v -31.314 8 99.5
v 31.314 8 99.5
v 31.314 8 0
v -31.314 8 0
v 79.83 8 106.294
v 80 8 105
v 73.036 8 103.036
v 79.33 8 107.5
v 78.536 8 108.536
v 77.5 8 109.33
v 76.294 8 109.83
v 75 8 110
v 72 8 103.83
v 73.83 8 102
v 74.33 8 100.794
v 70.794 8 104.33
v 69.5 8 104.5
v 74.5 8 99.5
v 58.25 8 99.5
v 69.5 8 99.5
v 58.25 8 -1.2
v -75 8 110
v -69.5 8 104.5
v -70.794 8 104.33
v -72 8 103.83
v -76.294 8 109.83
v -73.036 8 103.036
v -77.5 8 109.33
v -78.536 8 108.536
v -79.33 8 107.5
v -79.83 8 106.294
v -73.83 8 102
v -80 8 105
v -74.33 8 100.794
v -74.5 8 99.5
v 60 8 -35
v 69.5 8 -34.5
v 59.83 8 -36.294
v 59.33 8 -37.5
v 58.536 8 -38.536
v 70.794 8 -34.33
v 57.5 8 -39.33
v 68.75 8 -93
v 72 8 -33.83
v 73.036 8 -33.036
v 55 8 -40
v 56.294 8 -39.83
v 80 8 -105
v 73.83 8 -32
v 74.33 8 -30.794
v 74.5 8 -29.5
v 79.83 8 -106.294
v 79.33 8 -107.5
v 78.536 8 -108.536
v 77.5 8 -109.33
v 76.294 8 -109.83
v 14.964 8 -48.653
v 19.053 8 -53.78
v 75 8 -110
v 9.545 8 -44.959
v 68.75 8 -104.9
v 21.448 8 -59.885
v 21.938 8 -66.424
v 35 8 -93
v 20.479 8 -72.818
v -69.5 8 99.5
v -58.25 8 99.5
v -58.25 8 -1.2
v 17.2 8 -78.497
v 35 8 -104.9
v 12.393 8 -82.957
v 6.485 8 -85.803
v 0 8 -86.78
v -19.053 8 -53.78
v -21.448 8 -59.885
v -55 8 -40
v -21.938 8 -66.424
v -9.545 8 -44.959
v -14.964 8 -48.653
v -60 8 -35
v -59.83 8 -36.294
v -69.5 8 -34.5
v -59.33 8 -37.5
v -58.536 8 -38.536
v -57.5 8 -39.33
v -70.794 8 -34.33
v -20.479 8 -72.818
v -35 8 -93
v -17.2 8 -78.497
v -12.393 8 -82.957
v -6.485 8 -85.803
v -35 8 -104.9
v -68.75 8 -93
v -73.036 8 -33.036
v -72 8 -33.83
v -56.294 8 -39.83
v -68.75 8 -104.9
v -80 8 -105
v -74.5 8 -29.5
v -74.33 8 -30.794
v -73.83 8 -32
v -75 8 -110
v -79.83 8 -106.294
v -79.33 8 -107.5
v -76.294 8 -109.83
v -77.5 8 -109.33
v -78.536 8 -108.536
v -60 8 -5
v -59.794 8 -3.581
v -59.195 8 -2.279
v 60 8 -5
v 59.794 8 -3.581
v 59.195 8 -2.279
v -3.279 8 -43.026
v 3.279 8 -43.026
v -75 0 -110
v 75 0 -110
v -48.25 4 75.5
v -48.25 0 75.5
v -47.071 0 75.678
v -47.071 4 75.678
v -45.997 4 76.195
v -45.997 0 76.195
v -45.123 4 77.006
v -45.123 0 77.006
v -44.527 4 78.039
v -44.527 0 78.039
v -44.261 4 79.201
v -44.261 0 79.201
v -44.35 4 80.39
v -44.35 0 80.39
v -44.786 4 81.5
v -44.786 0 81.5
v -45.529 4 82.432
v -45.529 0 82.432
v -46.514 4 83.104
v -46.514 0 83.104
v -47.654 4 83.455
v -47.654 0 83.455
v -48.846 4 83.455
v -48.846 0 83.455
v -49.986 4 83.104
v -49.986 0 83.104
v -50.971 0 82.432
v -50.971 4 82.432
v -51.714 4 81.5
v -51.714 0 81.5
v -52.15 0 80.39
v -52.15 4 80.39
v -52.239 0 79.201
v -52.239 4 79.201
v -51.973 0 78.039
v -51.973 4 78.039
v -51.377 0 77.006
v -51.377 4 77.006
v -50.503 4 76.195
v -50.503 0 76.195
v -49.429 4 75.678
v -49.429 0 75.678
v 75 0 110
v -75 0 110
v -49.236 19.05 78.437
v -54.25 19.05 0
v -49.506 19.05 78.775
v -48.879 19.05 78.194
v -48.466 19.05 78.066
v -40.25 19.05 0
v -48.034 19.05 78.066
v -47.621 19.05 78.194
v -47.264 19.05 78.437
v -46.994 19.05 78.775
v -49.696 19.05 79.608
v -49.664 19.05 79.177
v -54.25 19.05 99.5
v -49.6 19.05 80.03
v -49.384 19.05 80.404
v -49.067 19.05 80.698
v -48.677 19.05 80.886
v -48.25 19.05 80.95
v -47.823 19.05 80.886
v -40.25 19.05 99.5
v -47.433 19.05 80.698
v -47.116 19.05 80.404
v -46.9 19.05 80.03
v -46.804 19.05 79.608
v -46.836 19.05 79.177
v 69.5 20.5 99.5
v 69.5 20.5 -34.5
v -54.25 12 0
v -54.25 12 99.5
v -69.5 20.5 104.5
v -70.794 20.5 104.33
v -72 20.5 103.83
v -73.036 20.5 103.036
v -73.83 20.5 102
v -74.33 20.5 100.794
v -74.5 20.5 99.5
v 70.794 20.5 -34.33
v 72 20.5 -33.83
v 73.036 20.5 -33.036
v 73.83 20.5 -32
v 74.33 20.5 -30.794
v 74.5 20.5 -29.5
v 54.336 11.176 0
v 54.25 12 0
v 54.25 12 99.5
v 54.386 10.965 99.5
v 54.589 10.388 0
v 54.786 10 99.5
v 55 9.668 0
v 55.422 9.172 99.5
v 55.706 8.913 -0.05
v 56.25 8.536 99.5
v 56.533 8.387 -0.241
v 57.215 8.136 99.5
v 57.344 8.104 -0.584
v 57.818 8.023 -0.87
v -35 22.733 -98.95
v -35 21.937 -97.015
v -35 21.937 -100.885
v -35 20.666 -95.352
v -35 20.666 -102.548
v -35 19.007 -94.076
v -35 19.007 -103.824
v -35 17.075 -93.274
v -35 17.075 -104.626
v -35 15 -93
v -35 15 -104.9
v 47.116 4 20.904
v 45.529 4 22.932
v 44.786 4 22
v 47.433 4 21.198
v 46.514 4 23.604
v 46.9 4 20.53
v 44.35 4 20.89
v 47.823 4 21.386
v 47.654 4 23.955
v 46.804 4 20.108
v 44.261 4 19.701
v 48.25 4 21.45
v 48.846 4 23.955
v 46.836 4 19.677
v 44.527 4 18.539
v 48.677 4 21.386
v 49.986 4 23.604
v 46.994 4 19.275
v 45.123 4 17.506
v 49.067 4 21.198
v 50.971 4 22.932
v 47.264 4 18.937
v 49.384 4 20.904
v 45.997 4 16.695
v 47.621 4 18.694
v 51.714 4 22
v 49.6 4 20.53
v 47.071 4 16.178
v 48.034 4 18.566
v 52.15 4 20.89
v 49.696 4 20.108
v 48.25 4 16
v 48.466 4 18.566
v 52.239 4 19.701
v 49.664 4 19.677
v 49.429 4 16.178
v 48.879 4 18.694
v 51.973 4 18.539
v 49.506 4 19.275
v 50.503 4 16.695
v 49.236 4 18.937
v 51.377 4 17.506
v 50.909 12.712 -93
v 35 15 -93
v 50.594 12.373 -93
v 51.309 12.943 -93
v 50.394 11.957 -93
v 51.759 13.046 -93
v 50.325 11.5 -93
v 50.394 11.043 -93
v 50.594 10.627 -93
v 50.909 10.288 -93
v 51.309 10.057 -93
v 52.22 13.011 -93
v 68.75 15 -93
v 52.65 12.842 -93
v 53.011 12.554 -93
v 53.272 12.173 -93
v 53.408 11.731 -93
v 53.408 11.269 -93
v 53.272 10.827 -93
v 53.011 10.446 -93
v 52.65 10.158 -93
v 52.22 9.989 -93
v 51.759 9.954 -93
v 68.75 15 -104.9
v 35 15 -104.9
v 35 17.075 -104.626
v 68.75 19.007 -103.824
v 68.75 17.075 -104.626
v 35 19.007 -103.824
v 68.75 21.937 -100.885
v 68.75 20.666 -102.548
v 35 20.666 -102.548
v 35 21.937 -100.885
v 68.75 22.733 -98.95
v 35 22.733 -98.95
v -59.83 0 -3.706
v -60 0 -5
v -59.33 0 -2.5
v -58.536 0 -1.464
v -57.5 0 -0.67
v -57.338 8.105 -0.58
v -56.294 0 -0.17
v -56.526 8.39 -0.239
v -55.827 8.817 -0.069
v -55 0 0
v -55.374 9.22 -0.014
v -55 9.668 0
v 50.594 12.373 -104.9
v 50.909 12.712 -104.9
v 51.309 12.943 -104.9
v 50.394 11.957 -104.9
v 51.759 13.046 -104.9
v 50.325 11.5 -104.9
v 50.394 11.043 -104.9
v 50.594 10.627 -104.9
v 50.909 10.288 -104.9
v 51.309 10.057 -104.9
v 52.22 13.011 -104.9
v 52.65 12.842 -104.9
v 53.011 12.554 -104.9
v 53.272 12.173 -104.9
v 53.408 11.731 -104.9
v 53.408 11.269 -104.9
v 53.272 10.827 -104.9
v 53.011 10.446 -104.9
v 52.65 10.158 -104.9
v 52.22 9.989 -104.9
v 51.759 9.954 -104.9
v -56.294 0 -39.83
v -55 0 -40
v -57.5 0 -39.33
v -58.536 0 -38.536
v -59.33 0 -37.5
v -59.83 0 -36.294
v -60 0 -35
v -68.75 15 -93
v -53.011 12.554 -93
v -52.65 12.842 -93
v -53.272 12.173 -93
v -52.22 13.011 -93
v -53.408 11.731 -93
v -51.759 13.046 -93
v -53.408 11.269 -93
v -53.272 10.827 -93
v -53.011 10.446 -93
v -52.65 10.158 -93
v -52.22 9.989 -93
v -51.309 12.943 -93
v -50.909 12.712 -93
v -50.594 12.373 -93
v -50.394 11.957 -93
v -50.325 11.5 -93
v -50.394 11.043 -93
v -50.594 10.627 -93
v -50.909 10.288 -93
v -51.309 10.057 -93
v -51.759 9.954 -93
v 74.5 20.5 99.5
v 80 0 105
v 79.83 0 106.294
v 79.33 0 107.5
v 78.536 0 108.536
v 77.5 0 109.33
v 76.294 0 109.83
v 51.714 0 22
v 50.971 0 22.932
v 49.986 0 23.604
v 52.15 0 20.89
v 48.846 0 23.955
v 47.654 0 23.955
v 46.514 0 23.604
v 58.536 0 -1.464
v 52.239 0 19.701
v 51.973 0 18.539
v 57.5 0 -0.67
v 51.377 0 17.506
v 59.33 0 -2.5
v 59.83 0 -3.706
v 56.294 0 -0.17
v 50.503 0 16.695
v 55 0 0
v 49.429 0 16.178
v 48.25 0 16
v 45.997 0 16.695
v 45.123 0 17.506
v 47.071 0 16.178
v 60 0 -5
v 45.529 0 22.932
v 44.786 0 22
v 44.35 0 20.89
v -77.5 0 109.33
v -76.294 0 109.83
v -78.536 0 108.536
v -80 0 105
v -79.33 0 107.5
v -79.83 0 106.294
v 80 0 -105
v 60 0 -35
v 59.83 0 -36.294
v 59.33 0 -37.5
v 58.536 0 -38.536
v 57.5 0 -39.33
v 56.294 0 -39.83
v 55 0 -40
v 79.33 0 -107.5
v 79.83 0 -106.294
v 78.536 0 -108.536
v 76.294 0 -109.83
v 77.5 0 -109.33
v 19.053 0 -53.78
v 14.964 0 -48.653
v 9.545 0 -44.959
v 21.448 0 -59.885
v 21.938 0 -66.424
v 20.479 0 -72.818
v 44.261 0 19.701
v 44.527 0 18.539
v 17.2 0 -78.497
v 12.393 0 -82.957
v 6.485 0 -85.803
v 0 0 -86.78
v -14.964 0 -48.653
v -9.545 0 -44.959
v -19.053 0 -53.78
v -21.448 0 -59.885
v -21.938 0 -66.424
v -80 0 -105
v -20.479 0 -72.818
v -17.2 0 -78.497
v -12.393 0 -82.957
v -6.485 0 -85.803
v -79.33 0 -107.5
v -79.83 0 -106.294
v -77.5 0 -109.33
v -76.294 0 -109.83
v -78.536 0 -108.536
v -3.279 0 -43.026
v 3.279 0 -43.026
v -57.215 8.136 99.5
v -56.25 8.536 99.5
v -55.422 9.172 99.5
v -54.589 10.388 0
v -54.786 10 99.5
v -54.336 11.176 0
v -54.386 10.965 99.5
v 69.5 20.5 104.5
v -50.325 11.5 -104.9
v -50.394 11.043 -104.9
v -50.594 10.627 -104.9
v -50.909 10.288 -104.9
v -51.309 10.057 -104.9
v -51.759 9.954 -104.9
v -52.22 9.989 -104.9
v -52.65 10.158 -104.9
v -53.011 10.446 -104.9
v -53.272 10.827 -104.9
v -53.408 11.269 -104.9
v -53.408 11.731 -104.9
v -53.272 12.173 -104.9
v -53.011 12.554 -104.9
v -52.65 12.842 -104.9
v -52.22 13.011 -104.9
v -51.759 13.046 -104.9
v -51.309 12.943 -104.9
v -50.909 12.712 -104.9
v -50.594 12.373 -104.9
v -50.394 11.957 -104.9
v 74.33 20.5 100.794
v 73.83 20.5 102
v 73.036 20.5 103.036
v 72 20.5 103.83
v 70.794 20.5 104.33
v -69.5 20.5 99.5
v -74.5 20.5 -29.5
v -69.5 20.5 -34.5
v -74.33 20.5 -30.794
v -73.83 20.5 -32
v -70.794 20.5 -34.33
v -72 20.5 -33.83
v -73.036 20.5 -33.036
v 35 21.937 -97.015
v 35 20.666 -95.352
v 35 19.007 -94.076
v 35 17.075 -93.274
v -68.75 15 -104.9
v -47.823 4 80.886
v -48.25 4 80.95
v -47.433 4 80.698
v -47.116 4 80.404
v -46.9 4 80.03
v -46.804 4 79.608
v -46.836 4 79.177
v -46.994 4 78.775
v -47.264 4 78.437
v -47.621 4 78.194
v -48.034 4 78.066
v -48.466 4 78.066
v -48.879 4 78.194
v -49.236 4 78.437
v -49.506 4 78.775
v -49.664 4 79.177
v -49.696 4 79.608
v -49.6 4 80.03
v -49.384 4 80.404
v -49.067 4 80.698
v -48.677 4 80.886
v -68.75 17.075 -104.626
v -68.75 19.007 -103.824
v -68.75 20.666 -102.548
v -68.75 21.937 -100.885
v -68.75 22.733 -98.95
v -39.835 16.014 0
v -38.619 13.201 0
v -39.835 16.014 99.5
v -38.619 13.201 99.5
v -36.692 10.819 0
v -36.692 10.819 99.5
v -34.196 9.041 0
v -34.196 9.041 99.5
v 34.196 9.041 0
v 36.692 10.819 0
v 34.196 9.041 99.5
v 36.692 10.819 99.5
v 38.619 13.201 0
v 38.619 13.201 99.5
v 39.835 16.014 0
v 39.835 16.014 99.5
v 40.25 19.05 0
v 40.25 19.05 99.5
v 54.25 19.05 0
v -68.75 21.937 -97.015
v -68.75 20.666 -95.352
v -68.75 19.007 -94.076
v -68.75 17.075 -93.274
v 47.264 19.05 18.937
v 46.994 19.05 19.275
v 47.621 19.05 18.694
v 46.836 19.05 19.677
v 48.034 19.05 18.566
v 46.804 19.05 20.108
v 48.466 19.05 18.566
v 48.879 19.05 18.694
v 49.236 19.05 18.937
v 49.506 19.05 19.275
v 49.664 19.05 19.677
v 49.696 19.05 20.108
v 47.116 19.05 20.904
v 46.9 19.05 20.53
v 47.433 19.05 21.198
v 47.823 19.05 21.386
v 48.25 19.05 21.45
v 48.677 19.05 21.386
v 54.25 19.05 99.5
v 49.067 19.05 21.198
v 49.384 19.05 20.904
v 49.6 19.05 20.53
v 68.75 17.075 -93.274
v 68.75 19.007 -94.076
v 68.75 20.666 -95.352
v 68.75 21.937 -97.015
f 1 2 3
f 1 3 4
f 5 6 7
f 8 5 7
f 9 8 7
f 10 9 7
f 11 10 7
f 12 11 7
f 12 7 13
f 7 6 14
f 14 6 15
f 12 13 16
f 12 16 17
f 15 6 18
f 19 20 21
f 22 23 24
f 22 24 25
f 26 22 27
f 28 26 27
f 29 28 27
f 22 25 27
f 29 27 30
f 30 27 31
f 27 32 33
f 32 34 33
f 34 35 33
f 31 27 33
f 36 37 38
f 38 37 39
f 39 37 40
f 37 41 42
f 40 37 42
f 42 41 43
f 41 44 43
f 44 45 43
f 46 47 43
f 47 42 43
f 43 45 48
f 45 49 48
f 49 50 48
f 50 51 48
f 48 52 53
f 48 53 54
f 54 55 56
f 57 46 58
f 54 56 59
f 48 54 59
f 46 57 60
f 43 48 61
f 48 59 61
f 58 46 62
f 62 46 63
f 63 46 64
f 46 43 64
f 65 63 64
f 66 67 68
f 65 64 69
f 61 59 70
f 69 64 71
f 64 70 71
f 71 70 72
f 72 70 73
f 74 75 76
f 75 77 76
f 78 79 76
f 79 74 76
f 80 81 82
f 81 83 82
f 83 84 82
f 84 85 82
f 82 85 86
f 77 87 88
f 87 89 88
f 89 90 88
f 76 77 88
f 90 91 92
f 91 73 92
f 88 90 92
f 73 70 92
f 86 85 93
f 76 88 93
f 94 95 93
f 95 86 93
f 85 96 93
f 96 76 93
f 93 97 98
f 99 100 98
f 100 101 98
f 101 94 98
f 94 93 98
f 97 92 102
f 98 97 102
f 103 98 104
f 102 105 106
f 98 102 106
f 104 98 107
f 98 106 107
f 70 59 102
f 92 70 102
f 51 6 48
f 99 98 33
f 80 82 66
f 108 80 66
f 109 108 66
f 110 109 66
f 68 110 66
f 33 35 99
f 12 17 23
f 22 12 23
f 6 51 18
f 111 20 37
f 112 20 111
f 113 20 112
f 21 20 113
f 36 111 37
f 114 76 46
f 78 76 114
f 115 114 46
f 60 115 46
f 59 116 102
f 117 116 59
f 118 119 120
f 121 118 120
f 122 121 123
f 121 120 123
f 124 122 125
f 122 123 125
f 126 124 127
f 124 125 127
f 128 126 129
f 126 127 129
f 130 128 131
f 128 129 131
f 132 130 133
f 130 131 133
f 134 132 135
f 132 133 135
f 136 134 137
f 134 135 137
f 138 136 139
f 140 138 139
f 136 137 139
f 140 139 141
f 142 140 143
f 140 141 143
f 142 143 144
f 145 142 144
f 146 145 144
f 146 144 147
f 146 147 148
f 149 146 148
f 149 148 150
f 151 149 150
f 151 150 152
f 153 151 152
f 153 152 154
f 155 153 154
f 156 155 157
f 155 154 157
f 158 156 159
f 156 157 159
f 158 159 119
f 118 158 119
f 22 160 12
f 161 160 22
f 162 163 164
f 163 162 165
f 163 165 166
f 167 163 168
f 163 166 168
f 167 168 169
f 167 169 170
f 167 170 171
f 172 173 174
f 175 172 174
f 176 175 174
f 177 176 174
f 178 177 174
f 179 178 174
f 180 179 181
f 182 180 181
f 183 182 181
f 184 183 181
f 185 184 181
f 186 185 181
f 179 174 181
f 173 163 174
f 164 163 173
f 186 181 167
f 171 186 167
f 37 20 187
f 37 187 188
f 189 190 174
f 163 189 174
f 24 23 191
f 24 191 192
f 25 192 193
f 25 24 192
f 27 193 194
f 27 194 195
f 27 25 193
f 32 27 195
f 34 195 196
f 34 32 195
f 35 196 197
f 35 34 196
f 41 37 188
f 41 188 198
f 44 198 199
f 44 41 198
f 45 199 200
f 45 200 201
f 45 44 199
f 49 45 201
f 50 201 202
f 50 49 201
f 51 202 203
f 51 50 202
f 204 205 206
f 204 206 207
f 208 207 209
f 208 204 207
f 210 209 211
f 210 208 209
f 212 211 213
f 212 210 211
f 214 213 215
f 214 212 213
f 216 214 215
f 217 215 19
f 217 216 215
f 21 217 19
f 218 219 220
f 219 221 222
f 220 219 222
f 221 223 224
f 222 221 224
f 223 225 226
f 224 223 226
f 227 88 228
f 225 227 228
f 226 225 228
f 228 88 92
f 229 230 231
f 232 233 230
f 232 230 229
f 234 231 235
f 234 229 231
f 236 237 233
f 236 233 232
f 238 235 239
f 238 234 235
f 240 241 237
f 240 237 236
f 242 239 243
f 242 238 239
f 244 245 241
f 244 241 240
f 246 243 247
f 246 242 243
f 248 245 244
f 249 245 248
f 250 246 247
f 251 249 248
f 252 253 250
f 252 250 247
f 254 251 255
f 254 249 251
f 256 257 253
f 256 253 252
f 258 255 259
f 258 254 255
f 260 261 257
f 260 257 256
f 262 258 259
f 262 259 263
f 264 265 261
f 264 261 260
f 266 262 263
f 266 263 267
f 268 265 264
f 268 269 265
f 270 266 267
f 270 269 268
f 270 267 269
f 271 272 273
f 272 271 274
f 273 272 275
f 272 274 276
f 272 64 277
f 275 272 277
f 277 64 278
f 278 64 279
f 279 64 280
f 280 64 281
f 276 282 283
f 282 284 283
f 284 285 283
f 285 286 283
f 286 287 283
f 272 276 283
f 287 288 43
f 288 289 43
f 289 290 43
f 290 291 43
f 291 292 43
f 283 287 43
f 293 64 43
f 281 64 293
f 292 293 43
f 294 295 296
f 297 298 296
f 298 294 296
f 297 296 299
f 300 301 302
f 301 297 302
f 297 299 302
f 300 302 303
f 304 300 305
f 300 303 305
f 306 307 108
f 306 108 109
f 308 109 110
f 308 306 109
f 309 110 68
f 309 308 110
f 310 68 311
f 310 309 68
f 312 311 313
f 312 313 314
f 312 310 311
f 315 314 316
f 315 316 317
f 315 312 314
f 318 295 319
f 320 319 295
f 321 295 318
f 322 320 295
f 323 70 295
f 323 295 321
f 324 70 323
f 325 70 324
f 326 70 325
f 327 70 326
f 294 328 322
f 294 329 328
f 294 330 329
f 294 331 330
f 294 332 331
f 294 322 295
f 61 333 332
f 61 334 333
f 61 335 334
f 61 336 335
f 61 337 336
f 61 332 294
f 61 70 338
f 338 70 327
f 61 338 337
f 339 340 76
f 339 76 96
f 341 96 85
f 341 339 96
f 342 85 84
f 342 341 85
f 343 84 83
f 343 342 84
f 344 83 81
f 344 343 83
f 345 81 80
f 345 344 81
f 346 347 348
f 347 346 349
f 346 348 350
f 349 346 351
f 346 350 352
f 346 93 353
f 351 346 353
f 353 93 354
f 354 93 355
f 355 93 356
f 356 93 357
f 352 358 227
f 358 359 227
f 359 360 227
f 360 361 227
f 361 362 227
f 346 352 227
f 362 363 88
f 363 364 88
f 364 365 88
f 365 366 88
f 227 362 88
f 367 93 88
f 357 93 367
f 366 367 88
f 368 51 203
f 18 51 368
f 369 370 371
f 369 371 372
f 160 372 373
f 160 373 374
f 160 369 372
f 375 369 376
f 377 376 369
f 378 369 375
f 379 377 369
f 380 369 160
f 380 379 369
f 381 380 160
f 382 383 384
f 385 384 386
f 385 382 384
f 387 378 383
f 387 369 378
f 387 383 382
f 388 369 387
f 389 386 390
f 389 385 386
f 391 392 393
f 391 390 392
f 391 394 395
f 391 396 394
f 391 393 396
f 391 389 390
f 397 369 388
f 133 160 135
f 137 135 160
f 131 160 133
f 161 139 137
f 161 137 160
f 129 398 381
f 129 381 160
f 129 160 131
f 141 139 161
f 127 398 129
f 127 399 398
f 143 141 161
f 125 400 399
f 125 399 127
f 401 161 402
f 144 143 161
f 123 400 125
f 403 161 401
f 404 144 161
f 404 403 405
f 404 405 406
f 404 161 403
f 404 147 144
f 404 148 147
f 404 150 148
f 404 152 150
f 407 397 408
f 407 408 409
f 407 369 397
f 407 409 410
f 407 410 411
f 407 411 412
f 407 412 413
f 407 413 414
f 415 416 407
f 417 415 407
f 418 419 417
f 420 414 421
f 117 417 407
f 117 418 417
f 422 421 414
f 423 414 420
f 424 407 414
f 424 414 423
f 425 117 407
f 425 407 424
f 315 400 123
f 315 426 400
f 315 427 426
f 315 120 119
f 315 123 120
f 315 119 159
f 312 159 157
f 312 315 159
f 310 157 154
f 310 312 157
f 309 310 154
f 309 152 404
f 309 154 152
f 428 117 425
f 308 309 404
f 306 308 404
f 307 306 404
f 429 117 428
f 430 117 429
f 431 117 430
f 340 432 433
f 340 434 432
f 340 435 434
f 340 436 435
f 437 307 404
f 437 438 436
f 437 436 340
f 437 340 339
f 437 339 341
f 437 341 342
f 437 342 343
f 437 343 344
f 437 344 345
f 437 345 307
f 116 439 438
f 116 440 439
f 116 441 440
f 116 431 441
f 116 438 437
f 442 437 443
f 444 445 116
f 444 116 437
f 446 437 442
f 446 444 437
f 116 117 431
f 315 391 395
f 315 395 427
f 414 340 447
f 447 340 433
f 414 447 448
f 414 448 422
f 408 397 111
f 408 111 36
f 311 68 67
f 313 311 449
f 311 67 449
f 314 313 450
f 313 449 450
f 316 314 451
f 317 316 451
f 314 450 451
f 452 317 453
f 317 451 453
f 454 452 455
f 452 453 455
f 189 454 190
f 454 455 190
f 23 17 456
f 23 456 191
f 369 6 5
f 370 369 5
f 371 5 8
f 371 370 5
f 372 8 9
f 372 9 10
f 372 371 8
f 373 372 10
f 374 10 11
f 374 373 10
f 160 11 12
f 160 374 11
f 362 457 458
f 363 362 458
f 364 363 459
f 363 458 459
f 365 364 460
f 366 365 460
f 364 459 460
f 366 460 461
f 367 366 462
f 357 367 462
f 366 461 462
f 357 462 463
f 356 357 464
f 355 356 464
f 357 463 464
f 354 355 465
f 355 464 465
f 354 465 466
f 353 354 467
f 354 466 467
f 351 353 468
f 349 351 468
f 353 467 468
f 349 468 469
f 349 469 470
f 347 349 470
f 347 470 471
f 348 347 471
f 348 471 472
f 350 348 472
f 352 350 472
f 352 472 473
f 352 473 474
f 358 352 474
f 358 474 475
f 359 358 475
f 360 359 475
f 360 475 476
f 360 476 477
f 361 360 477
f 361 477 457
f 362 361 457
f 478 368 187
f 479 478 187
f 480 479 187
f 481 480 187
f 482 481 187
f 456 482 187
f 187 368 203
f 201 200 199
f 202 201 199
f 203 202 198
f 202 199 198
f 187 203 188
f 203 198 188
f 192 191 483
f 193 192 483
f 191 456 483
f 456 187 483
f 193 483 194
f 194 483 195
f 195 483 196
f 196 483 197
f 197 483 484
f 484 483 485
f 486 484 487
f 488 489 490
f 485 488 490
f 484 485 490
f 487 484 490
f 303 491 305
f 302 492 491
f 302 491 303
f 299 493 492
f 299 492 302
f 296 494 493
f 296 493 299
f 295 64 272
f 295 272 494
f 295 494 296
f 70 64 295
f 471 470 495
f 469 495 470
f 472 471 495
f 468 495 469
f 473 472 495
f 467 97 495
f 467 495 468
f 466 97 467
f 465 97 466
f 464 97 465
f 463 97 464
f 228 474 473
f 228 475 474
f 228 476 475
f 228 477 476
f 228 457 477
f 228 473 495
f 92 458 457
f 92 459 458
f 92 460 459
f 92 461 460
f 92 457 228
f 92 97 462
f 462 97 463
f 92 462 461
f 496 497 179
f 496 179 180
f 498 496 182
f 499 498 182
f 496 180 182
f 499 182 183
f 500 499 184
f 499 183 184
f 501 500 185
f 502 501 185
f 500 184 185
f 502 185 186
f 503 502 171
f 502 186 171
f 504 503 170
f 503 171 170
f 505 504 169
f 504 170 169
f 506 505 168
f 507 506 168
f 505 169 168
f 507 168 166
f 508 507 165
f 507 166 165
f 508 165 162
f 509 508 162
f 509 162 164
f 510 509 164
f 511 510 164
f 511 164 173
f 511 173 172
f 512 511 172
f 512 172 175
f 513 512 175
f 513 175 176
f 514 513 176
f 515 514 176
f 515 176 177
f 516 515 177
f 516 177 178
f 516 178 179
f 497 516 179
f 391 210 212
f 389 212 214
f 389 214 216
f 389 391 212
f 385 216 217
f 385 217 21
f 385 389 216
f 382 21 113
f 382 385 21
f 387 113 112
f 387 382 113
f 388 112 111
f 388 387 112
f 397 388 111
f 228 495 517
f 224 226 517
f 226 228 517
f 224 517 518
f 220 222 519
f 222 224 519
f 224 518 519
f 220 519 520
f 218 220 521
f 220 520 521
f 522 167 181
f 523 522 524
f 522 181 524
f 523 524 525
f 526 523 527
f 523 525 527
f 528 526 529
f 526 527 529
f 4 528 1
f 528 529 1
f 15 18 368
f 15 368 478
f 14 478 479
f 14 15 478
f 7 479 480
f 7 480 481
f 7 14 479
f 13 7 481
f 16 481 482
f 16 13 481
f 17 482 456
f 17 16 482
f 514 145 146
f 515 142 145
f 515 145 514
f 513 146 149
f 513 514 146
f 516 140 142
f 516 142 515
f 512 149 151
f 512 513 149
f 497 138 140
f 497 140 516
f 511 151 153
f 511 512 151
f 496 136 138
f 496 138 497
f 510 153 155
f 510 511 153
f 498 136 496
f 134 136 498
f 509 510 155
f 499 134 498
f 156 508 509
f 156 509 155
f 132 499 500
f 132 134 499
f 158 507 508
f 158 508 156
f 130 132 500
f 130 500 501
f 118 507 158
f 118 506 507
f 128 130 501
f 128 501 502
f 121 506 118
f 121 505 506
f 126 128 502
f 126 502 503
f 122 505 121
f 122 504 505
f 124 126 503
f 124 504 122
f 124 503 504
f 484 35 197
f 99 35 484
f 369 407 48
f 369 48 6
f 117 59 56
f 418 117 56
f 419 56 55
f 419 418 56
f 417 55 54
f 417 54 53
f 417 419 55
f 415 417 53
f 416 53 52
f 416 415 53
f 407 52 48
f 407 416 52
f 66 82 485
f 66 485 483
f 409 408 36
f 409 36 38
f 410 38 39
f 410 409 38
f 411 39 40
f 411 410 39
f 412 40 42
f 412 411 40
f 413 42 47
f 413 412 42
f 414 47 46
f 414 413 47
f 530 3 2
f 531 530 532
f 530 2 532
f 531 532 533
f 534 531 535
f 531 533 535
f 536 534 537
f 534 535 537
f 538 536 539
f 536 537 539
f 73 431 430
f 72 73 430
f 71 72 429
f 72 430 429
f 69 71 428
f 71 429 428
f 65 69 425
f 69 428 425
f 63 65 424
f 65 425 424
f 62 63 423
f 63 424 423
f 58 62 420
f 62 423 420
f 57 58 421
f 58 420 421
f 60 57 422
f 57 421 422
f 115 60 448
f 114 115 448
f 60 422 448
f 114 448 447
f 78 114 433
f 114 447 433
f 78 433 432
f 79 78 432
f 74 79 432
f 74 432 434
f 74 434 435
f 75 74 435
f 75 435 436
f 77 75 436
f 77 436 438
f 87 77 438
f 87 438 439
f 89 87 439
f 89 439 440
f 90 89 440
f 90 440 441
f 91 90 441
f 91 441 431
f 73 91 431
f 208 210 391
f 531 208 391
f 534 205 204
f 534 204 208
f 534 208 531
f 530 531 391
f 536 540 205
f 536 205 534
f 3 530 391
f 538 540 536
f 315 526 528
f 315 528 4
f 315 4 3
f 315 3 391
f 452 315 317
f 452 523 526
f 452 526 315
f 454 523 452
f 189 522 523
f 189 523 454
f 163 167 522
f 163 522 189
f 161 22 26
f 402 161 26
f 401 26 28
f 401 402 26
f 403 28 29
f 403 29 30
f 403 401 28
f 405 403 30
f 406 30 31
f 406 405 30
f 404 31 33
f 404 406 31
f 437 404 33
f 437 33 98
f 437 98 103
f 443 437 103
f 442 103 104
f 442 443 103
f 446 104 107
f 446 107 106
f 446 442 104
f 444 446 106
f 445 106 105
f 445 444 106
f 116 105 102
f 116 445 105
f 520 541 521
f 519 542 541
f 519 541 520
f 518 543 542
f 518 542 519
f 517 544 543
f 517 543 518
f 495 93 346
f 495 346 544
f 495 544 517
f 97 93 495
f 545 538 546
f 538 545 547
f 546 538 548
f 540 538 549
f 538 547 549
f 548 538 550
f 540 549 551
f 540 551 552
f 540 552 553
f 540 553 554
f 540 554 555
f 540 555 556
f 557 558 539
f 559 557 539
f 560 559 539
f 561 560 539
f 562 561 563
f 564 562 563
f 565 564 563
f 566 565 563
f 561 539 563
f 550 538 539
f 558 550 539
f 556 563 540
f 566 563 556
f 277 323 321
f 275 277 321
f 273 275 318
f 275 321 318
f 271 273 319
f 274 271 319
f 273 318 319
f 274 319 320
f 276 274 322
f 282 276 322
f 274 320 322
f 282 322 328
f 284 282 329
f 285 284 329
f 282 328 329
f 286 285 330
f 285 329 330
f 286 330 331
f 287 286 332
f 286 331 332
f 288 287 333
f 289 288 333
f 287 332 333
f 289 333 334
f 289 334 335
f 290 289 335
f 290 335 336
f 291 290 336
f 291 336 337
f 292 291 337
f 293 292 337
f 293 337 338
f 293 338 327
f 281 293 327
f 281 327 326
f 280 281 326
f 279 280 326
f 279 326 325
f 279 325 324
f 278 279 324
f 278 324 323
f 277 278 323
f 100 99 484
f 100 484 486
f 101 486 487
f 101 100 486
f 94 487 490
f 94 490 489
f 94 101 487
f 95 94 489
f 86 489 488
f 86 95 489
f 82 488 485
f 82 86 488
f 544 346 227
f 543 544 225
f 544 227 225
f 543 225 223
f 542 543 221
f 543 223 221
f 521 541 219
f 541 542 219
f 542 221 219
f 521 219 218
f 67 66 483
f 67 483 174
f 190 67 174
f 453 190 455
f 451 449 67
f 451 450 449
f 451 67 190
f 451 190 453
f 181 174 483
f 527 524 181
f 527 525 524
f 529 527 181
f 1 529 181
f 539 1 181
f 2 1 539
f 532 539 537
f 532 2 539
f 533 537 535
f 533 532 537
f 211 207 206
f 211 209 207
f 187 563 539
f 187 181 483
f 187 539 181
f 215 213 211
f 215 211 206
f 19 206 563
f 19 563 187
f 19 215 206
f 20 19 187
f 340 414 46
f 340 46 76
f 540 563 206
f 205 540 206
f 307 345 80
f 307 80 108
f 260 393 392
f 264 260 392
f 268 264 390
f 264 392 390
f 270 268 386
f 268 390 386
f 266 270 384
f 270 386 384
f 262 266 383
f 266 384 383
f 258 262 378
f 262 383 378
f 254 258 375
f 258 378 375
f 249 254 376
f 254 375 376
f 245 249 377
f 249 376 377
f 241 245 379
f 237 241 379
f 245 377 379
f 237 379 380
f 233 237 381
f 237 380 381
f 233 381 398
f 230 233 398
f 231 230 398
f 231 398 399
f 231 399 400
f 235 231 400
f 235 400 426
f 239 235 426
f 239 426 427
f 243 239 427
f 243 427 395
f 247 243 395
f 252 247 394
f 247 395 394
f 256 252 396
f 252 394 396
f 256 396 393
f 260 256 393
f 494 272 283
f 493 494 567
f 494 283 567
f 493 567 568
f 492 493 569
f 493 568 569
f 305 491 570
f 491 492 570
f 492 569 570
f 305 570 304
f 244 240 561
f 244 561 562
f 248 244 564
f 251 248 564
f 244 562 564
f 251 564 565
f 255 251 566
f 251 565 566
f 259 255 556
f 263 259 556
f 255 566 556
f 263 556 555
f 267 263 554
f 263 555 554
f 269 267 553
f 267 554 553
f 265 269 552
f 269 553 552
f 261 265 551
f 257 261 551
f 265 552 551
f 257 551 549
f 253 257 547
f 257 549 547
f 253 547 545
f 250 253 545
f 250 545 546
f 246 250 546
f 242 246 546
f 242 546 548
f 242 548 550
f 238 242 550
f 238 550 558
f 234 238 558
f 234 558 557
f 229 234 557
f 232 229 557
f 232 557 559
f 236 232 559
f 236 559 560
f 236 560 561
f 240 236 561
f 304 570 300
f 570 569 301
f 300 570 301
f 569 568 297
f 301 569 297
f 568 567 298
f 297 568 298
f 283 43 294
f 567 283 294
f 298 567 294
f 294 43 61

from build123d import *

# Parameters (mm, degrees)
BOSS_EXTRUDE1_DEPTH = 8
BOSS_EXTRUDE2_START = 8
SKETCH3_7_W         = 139.5
SKETCH3_7_H         = 11.9
BOSS_EXTRUDE2_DEPTH = 15
FILLET1_R           = 8
CUT_EXTRUDE1_REACH  = 139.901
BOSS_EXTRUDE3_DEPTH = 12.5
BOSS_EXTRUDE4_DEPTH = 99.5
CUT_EXTRUDE3_REACH  = 138.81
SKETCH9_W           = 70
SKETCH9_H           = 11.9
SKETCH9_W_2         = 1
CUT_EXTRUDE5_REACH  = 139.901
SKETCH11_R          = 22
FILLET2_R           = 4
CUT_EXTRUDE6_REACH  = 139.342
SKETCH12_R          = 1.45
SKETCH13_R          = 4
CUT_EXTRUDE7_DEPTH  = 4
CUT_EXTRUDE2_REACH  = 232.432
SKETCH6_R           = 1.55


with BuildPart() as part:
    # Sketch3 → Boss-Extrude1 (new body)
    with BuildSketch(Plane(origin=(0, 0, 0), x_dir=(1, 0, 0), z_dir=(0, 1, 0))):
        with BuildLine():
            Line((-75, 110), (75, 110))
            ThreePointArc((75, 110), (78.535533906, 108.535533906), (80, 105))
            Line((80, 105), (80, -105))
            ThreePointArc((80, -105), (78.535533906, -108.535533906), (75, -110))
            Line((75, -110), (-75, -110))
            ThreePointArc((-75, -110), (-78.535533906, -108.535533906), (-80, -105))
            Line((-80, -105), (-80, 105))
            ThreePointArc((-80, 105), (-78.535533906, 108.535533906), (-75, 110))
        make_face()
    extrude(amount=BOSS_EXTRUDE1_DEPTH)

    # Sketch3<7> → Boss-Extrude2 (add)
    with BuildSketch(Plane(origin=(0, 0, 0), x_dir=(1, 0, 0), z_dir=(0, 1, 0)).offset(BOSS_EXTRUDE2_START)):
        with Locations((0, 98.95)):
            Rectangle(SKETCH3_7_W, SKETCH3_7_H)
    extrude(amount=BOSS_EXTRUDE2_DEPTH)

    # Fillet1
    # the kernel refuses this fillet: 8 mm, written as the material it takes off along each edge
    with BuildSketch(Plane(origin=(89.75, 23, -93), x_dir=(0, -1, 0), z_dir=(-1, 0, 0)), Plane(origin=(-89.75, 23, -104.9), x_dir=(0, -1, 0), z_dir=(1, 0, 0))) as fillet1_piece_1:
        with BuildLine():
            CenterArc((FILLET1_R, -FILLET1_R), FILLET1_R, 90, 90)
            Line((0, -FILLET1_R), (0, 0))
            Line((0, 0), (FILLET1_R, 0))
        make_face()
    extrude(amount=179.5, mode=Mode.SUBTRACT)

    # Sketch4 → Cut-Extrude1 (cut, up to next)
    with BuildSketch(Plane.XZ, mode=Mode.PRIVATE) as cut_extrude1_sk1:
        with BuildLine():
            Line((-55, 0), (55, 0))
            ThreePointArc((55, 0), (58.535533906, -1.464466094), (60, -5))
            Line((60, -5), (60, -35))
            ThreePointArc((60, -35), (58.535533906, -38.535533906), (55, -40))
            Line((55, -40), (-55, -40))
            ThreePointArc((-55, -40), (-58.535533906, -38.535533906), (-60, -35))
            Line((-60, -35), (-60, -5))
            ThreePointArc((-60, -5), (-58.535533906, -1.464466094), (-55, 0))
        make_face()
    cut_extrude1_tool1 = extrude(cut_extrude1_sk1.sketch, amount=-CUT_EXTRUDE1_REACH, mode=Mode.PRIVATE) & part.part
    add(cut_extrude1_tool1.solids().sort_by_distance((0, 0, -20))[0], mode=Mode.SUBTRACT)

    # Sketch5 → Boss-Extrude3 (add)
    with BuildSketch(Plane(origin=(0, 8, 0), x_dir=(1, 0, 0), z_dir=(0, 1, 0))):
        with BuildLine():
            ThreePointArc((-69.5, -104.5), (-73.035533906, -103.035533906), (-74.5, -99.5))
            Line((-74.5, -99.5), (-74.5, 29.5))
            ThreePointArc((-74.5, 29.5), (-73.035533906, 33.035533906), (-69.5, 34.5))
            Line((-69.5, 34.5), (-69.5, -99.5))
            Line((-69.5, -99.5), (69.5, -99.5))
            Line((69.5, -99.5), (69.5, 34.5))
            ThreePointArc((69.5, 34.5), (73.035533906, 33.035533906), (74.5, 29.5))
            Line((74.5, 29.5), (74.5, -99.5))
            ThreePointArc((74.5, -99.5), (73.035533906, -103.035533906), (69.5, -104.5))
            Line((69.5, -104.5), (-69.5, -104.5))
        make_face()
    extrude(amount=BOSS_EXTRUDE3_DEPTH)

    # Sketch8 → Boss-Extrude4 (add)
    with BuildSketch(Plane(origin=(0, 0, 99.5), x_dir=(-1, 0, 0), z_dir=(0, 0, -1))):
        with BuildLine():
            ThreePointArc((-31.313789331, 8), (-37.73637637, 11.944397261), (-40.25, 19.05))
            Line((-40.25, 19.05), (-54.25, 19.05))
            Line((-54.25, 19.05), (-54.25, 4.75))
            Line((-54.25, 4.75), (-28.95, 4.75))
            ThreePointArc((-28.95, 4.75), (-33.770529017, 5.586995135), (-38.026756028, 8))
            Line((-38.026756028, 8), (-31.313789331, 8))
        make_face()
        with BuildLine():
            ThreePointArc((40.25, 19.05), (37.73637637, 11.944397261), (31.313789331, 8))
            Line((31.313789331, 8), (38.026756028, 8))
            ThreePointArc((38.026756028, 8), (33.770529017, 5.586995135), (28.95, 4.75))
            Line((28.95, 4.75), (54.25, 4.75))
            Line((54.25, 4.75), (54.25, 19.05))
            Line((54.25, 19.05), (40.25, 19.05))
        make_face()
    extrude(amount=BOSS_EXTRUDE4_DEPTH)

    # Sketch9 → Cut-Extrude3 (cut, up to next)
    with BuildSketch(Plane(origin=(0, 8, 0), x_dir=(1, 0, 0), z_dir=(0, 1, 0)), mode=Mode.PRIVATE) as cut_extrude3_sk1:
        with Locations((0, 98.95)):
            Rectangle(SKETCH9_W, SKETCH9_H)
    cut_extrude3_tool1 = extrude(cut_extrude3_sk1.sketch, amount=CUT_EXTRUDE3_REACH, mode=Mode.PRIVATE) & part.part
    # Sketch9 → Cut-Extrude3 (cut, up to next)
    with BuildSketch(Plane(origin=(0, 8, 0), x_dir=(1, 0, 0), z_dir=(0, 1, 0)), mode=Mode.PRIVATE) as cut_extrude3_sk2:
        with Locations((-69.25, 98.95)):
            Rectangle(SKETCH9_W_2, SKETCH9_H)
    cut_extrude3_tool2 = extrude(cut_extrude3_sk2.sketch, amount=CUT_EXTRUDE3_REACH, mode=Mode.PRIVATE) & part.part
    # Sketch9 → Cut-Extrude3 (cut, up to next)
    with BuildSketch(Plane(origin=(0, 8, 0), x_dir=(1, 0, 0), z_dir=(0, 1, 0)), mode=Mode.PRIVATE) as cut_extrude3_sk3:
        with Locations((69.25, 98.95)):
            Rectangle(SKETCH9_W_2, SKETCH9_H)
    cut_extrude3_tool3 = extrude(cut_extrude3_sk3.sketch, amount=CUT_EXTRUDE3_REACH, mode=Mode.PRIVATE) & part.part
    add(cut_extrude3_tool1.solids().sort_by_distance((0, 8, -98.95))[0], mode=Mode.SUBTRACT)
    add(cut_extrude3_tool2.solids().sort_by_distance((-69.25, 8, -98.95))[0], mode=Mode.SUBTRACT)
    add(cut_extrude3_tool3.solids().sort_by_distance((69.25, 8, -98.95))[0], mode=Mode.SUBTRACT)

    # Sketch11 → Cut-Extrude5 (cut, up to next)
    with BuildSketch(Plane.XZ, mode=Mode.PRIVATE) as cut_extrude5_sk1:
        with Locations(Location((0, -64.78, 0), (0, 0, 270))):
            Circle(SKETCH11_R)
    cut_extrude5_tool1 = extrude(cut_extrude5_sk1.sketch, amount=-CUT_EXTRUDE5_REACH, mode=Mode.PRIVATE) & part.part
    add(cut_extrude5_tool1.solids().sort_by_distance((0, 0, -64.78))[0], mode=Mode.SUBTRACT)

    # Fillet2
    fillet2_edges = [part.edges().sort_by_distance(p)[0] for p in [
        (54.25, 8, 49.75),
        (-54.25, 8, 49.75),
    ]]
    fillet(fillet2_edges, radius=FILLET2_R)

    # Sketch12 → Cut-Extrude6 (cut, up to next)
    with BuildSketch(Plane(origin=(0, 19.05, 0), x_dir=(1, 0, 0), z_dir=(0, 1, 0)), mode=Mode.PRIVATE) as cut_extrude6_sk1:
        with Locations(Location((48.25, -20, 0), (0, 0, 270))):
            Circle(SKETCH12_R)
    cut_extrude6_tool1 = extrude(cut_extrude6_sk1.sketch, amount=-CUT_EXTRUDE6_REACH, mode=Mode.PRIVATE) & part.part
    # Sketch12 → Cut-Extrude6 (cut, up to next)
    with BuildSketch(Plane(origin=(0, 19.05, 0), x_dir=(1, 0, 0), z_dir=(0, 1, 0)), mode=Mode.PRIVATE) as cut_extrude6_sk2:
        with Locations(Location((-48.25, -79.5, 0), (0, 0, 270))):
            Circle(SKETCH12_R)
    cut_extrude6_tool2 = extrude(cut_extrude6_sk2.sketch, amount=-CUT_EXTRUDE6_REACH, mode=Mode.PRIVATE) & part.part
    add(cut_extrude6_tool1.solids().sort_by_distance((48.25, 19.05, 20))[0], mode=Mode.SUBTRACT)
    add(cut_extrude6_tool2.solids().sort_by_distance((-48.25, 19.05, 79.5))[0], mode=Mode.SUBTRACT)

    # Sketch13 → Cut-Extrude7 (cut)
    with BuildSketch(Plane.XZ):
        with Locations(Location((-48.25, 79.5, 0), (0, 0, 270))):
            Circle(SKETCH13_R)
        with Locations(Location((48.25, 20, 0), (0, 0, 270))):
            Circle(SKETCH13_R)
    extrude(amount=-CUT_EXTRUDE7_DEPTH, mode=Mode.SUBTRACT)

    # Sketch6 → Cut-Extrude2 (cut, up to next)
    with BuildSketch(Plane(origin=(0, 0, -104.9), x_dir=(-1, 0, 0), z_dir=(0, 0, -1)), mode=Mode.PRIVATE) as cut_extrude2_sk1:
        with Locations((-51.875, 11.5)):
            Circle(SKETCH6_R)
    cut_extrude2_tool1 = extrude(cut_extrude2_sk1.sketch, amount=-CUT_EXTRUDE2_REACH, mode=Mode.PRIVATE) & part.part
    # Sketch6 → Cut-Extrude2 (cut, up to next)
    with BuildSketch(Plane(origin=(0, 0, -104.9), x_dir=(-1, 0, 0), z_dir=(0, 0, -1)), mode=Mode.PRIVATE) as cut_extrude2_sk2:
        with Locations(Location((51.875, 11.5, 0), (0, 0, 180))):
            Circle(SKETCH6_R)
    cut_extrude2_tool2 = extrude(cut_extrude2_sk2.sketch, amount=-CUT_EXTRUDE2_REACH, mode=Mode.PRIVATE) & part.part
    add(cut_extrude2_tool1.solids().sort_by_distance((51.875, 11.5, -104.9))[0], mode=Mode.SUBTRACT)
    add(cut_extrude2_tool2.solids().sort_by_distance((-51.875, 11.5, -104.9))[0], mode=Mode.SUBTRACT)


solid = part.part
